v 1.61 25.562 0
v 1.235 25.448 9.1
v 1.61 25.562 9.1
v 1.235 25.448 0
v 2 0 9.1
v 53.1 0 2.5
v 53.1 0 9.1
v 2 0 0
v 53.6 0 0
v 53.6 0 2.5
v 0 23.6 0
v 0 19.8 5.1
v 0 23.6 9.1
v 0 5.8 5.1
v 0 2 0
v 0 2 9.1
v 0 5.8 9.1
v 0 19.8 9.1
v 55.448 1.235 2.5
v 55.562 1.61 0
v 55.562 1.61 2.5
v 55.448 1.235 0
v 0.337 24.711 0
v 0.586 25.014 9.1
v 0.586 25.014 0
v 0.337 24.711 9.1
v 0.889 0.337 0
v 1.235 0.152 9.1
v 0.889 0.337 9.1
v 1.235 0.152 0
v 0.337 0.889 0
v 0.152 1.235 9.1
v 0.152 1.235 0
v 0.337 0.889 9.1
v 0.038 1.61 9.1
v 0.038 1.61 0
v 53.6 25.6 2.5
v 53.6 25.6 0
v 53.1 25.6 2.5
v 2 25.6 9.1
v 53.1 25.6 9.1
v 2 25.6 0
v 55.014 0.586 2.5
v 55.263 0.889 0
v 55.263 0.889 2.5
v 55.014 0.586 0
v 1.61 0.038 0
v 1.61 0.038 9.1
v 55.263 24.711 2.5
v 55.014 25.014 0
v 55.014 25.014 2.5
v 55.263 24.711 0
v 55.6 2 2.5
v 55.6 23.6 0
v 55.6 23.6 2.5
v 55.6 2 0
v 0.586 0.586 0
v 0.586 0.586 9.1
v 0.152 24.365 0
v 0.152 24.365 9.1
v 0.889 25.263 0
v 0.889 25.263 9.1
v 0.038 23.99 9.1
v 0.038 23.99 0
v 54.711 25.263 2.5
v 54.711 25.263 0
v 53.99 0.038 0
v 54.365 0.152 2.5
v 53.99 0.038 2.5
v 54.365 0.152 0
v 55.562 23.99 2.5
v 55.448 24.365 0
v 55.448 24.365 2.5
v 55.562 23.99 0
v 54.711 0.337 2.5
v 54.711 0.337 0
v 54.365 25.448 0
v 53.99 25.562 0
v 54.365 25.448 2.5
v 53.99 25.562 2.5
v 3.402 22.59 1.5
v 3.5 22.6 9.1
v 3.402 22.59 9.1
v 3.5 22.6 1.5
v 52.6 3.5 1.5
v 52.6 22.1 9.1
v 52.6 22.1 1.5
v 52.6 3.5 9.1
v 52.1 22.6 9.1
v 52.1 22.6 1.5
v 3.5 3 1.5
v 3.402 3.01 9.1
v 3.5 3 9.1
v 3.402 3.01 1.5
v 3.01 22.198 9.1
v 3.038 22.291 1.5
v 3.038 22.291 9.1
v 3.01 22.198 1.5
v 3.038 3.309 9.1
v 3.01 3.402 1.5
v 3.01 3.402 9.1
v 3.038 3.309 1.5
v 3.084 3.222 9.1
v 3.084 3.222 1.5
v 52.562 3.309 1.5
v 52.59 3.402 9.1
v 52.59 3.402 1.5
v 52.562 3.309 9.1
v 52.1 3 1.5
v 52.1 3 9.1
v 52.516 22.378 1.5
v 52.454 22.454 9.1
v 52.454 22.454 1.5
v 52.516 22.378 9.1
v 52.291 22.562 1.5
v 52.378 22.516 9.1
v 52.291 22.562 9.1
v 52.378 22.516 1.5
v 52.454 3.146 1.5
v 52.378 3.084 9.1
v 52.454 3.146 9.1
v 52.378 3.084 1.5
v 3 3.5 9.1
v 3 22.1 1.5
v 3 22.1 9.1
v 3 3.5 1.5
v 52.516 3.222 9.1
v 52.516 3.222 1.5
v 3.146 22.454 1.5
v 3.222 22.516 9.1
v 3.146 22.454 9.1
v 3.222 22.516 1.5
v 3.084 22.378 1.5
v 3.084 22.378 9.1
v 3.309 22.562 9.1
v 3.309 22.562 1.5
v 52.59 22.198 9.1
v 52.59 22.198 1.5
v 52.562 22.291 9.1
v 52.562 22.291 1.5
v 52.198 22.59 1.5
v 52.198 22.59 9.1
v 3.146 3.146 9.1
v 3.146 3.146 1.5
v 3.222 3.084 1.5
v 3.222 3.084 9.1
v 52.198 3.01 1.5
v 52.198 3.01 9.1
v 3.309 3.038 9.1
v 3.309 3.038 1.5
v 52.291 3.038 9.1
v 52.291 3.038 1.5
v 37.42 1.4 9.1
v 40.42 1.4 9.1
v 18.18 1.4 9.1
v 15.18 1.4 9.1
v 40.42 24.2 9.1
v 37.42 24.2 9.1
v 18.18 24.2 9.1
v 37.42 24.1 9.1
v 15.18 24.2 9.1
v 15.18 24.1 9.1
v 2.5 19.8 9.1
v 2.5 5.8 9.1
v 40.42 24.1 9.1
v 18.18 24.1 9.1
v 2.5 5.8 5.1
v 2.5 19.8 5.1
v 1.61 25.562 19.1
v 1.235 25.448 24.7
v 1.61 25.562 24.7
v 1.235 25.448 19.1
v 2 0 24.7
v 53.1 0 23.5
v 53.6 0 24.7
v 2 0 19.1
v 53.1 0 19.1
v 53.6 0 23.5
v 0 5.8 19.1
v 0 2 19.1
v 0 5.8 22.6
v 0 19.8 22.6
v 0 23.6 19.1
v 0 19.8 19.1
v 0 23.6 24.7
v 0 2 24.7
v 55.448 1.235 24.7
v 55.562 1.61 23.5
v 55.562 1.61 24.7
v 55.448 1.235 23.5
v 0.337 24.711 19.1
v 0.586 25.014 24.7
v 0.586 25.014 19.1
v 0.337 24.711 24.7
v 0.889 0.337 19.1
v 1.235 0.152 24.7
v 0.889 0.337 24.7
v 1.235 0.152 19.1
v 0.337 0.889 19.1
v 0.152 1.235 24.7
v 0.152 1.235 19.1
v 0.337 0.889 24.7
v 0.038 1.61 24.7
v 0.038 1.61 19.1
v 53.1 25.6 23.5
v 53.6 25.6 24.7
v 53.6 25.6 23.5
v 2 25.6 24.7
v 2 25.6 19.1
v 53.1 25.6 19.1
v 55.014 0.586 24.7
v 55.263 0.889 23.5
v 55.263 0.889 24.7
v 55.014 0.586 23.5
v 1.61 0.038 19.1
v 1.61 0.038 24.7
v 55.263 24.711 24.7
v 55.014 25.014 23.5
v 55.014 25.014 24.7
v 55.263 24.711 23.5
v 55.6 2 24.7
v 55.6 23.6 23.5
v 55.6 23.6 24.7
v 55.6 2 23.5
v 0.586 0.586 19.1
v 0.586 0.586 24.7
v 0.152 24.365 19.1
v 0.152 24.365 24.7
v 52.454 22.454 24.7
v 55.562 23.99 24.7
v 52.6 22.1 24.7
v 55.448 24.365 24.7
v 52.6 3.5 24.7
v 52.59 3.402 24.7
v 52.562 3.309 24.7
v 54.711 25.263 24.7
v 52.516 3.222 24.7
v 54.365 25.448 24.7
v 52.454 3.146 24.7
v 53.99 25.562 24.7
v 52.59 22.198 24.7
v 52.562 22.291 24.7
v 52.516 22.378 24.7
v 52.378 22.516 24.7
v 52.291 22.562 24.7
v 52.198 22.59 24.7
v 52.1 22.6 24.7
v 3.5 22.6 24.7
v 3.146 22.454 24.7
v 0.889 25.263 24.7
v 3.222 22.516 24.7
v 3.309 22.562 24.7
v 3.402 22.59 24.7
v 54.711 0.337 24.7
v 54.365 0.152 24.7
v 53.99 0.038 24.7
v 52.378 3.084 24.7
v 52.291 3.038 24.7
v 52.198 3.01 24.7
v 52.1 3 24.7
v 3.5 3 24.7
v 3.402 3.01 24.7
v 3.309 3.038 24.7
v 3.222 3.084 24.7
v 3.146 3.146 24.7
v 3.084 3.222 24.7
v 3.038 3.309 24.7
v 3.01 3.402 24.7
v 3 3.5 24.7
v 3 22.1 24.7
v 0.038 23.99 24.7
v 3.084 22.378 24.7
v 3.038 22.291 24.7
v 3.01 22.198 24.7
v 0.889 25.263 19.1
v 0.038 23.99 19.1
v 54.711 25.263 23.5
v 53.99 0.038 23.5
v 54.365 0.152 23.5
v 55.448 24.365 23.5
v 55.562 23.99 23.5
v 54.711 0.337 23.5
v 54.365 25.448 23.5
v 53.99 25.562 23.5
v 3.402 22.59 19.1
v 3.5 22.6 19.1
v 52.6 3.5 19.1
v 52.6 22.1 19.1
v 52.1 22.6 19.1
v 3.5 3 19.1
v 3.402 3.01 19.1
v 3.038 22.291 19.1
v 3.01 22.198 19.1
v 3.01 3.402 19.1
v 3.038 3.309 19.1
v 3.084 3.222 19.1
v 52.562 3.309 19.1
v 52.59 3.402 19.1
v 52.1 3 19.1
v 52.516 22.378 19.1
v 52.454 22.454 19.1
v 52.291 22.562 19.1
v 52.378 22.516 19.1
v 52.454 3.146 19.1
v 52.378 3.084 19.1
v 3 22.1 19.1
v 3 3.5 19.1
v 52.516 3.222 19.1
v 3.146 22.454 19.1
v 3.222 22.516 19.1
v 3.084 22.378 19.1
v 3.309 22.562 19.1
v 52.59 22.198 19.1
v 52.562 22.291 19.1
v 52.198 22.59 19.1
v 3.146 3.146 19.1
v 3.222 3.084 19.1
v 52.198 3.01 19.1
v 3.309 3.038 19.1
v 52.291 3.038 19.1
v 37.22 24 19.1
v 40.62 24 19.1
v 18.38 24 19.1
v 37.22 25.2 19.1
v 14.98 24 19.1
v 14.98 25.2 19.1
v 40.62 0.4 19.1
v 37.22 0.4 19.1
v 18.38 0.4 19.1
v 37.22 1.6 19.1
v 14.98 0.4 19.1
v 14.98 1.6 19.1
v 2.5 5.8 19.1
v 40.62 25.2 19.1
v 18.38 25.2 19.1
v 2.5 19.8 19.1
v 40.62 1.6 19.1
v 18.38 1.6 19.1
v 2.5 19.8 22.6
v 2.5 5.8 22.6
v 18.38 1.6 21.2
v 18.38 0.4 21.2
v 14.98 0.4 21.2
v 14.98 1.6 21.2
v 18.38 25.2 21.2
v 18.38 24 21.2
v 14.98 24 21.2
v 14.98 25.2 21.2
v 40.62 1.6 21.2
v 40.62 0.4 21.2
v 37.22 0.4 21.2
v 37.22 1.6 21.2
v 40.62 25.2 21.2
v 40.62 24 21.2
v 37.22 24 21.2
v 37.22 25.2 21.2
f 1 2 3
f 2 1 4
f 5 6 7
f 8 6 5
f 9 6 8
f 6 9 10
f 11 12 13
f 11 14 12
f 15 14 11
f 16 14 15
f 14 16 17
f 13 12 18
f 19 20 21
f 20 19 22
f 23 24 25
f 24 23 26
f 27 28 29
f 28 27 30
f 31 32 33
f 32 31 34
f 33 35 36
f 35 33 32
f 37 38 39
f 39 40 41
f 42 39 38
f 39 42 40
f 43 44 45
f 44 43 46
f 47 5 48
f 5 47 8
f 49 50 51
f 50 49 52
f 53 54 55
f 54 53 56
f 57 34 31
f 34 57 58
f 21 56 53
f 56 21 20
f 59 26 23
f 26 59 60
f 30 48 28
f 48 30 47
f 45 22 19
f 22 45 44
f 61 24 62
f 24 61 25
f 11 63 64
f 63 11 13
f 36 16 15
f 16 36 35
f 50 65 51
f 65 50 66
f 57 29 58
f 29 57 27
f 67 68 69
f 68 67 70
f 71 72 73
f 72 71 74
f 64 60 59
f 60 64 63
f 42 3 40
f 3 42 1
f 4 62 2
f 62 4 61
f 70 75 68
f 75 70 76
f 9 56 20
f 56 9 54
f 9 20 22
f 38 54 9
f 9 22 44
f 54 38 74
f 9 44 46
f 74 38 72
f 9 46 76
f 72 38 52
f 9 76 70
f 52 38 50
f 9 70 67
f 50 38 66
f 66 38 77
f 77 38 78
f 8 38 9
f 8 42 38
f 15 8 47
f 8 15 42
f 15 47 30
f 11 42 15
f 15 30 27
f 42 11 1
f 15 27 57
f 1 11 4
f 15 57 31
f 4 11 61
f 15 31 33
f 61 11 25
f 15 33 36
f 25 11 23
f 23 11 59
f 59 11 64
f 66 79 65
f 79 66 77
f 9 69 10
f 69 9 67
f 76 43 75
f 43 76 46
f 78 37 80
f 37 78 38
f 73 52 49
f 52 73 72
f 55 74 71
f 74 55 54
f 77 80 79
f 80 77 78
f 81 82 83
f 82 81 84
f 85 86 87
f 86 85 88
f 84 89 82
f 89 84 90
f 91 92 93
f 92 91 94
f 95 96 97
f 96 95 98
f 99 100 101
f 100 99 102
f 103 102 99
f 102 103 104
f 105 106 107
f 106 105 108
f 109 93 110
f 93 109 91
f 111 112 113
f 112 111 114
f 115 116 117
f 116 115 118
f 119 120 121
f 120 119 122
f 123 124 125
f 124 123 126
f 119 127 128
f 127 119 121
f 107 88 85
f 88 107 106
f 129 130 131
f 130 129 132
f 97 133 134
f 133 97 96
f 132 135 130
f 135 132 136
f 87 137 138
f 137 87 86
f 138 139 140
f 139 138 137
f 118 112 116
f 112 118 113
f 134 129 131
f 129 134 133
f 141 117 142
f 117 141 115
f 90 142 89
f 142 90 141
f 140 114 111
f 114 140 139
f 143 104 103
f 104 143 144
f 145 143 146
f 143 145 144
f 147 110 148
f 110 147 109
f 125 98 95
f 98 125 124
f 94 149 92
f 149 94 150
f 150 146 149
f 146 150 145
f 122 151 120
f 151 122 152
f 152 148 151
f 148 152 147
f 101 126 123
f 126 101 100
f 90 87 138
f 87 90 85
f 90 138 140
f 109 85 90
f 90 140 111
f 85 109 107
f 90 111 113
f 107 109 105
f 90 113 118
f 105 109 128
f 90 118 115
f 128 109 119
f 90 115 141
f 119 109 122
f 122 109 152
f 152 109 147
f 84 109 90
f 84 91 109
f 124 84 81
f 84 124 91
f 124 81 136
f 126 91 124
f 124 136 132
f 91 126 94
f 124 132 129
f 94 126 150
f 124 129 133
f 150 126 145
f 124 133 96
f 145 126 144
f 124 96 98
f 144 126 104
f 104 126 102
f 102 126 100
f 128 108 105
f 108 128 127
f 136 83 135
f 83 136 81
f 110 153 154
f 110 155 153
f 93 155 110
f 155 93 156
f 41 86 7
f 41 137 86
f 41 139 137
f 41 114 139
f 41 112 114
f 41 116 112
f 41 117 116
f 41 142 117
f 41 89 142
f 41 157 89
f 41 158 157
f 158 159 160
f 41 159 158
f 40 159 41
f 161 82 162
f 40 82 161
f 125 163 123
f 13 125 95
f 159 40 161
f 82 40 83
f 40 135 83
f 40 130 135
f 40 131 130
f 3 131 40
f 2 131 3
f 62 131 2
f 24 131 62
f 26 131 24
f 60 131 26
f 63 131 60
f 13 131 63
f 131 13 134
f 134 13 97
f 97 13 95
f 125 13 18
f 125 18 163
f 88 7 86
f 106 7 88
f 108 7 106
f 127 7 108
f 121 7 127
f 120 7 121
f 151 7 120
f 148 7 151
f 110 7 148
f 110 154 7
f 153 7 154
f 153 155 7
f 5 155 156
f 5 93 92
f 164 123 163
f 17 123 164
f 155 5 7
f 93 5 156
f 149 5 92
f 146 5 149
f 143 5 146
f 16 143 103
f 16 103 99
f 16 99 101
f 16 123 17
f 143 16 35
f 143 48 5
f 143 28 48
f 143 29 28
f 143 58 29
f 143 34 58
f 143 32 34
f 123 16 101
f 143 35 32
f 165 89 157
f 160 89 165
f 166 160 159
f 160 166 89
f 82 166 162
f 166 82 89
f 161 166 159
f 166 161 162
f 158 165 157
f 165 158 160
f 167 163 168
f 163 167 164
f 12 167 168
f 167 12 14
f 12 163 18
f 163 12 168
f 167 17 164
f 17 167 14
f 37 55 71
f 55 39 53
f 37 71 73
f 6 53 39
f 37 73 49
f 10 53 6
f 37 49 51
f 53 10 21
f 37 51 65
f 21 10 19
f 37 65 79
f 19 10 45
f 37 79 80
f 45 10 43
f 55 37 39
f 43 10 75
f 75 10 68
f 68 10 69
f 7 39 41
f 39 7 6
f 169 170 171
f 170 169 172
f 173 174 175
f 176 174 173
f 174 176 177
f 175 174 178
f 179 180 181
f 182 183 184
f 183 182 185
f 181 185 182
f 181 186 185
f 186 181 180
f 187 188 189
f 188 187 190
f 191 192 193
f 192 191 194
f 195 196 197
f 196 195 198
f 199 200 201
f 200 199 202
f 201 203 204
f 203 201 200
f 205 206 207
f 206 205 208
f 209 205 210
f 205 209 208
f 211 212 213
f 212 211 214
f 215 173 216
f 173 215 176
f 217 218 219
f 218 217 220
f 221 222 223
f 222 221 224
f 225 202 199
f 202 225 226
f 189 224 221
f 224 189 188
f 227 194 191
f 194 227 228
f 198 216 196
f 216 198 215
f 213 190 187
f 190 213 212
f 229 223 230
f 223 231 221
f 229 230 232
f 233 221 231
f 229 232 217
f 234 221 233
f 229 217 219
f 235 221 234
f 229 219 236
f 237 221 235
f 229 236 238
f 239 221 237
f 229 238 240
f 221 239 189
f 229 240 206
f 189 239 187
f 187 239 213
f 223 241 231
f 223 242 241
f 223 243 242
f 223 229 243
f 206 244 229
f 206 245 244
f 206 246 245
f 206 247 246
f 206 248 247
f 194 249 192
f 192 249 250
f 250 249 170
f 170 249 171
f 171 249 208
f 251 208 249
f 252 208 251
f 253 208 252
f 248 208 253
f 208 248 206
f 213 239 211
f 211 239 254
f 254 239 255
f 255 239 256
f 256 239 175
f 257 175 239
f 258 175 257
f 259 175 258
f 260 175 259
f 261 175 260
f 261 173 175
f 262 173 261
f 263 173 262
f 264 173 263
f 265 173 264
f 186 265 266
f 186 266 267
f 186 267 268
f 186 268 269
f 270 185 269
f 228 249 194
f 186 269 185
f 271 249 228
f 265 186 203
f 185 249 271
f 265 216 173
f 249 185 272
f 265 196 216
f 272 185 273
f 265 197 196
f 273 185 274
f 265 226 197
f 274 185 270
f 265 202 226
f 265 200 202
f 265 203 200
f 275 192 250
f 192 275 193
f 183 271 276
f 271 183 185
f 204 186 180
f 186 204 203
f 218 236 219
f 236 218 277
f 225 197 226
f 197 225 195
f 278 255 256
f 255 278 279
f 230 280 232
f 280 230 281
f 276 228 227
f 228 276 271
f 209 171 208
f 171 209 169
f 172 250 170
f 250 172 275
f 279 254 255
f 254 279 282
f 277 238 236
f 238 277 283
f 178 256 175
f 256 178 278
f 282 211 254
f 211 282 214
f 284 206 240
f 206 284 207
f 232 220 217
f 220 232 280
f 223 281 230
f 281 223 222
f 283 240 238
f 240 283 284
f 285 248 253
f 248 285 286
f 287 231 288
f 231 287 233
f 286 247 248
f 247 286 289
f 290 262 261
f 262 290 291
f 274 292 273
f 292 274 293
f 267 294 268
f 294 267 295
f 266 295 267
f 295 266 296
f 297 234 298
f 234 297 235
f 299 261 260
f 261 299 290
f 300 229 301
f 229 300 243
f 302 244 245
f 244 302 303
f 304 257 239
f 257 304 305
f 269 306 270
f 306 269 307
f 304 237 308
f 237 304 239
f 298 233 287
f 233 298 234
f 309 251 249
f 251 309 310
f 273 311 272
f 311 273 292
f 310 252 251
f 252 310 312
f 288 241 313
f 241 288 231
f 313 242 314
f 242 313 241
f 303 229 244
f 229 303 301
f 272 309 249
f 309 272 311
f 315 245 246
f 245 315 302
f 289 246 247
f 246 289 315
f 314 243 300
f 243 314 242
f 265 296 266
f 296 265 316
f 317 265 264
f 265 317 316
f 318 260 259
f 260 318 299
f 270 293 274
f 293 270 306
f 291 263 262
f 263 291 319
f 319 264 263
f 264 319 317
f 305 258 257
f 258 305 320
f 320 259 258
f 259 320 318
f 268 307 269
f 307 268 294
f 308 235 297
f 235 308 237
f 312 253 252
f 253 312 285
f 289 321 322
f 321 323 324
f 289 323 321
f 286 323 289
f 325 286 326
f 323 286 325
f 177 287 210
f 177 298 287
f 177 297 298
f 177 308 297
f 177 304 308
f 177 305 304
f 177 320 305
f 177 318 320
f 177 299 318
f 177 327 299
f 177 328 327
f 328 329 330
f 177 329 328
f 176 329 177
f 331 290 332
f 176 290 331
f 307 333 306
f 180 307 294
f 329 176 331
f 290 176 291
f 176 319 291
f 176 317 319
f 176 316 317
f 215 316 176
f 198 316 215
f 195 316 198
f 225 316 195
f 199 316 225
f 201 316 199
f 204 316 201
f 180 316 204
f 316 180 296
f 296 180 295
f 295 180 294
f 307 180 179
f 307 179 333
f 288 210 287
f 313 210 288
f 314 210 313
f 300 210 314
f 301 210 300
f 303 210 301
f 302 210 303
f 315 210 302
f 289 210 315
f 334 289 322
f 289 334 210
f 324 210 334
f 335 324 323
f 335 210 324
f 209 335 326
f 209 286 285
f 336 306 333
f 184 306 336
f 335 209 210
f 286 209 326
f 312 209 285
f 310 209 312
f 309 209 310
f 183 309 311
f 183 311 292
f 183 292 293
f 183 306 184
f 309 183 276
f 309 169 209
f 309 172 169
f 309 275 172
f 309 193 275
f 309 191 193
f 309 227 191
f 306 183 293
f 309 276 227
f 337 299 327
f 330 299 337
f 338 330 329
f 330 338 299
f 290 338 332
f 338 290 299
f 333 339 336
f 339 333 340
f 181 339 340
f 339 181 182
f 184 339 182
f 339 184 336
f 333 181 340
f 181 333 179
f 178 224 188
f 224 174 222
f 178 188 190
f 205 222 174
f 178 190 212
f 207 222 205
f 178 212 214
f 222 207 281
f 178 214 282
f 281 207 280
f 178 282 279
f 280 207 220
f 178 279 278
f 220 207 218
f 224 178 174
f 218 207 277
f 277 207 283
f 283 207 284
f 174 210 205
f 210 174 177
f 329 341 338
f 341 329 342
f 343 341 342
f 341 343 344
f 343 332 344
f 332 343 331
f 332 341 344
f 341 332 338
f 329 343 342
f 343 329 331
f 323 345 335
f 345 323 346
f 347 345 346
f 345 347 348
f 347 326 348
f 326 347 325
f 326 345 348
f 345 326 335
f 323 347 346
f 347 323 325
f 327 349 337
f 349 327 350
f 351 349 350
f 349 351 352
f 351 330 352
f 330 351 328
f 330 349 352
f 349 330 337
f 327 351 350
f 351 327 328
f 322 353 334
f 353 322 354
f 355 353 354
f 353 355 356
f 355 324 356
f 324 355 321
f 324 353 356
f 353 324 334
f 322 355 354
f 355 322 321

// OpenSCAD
/*
 * usb-to-msx-mouse-case.scad — Parametric snap-fit case for USB-to-MSX mouse adapter
 *
 * Two-piece design: bottom (tray) + top (lid) with snap-fit clips.
 * USB-A connector on one short edge, DB-9 on the other.
 *
 * To render:
 *   openscad -o case-bottom.stl -D 'part="bottom"' usb-to-msx-mouse-case.scad
 *   openscad -o case-top.stl -D 'part="top"' usb-to-msx-mouse-case.scad
 *
 * Print settings: PLA, 0.2mm layer height, no supports needed.
 */

/* ── Configuration ────────────────────────────────────────────────── */

// Which part to render: "bottom", "top", or "both" (exploded view)
part = "both";

// PCB dimensions (mm)
pcb_length = 52;      // X axis (USB-A to DB-9)
pcb_width  = 22;      // Y axis
pcb_thick  = 1.6;     // Board thickness

// Case wall parameters
wall = 1.5;           // Wall thickness
gap = 0.3;            // Clearance between PCB and case walls
bottom_thick = 1.5;   // Bottom floor thickness
top_thick = 1.2;      // Top ceiling thickness

// Total interior dimensions
int_length = pcb_length + 2 * gap;
int_width  = pcb_width + 2 * gap;
int_height = 12;      // Interior height (accommodates components + connectors)

// PCB sits on ledges inside the case
pcb_ledge = 0.8;      // Width of support ledge
pcb_z = 3;            // Height of PCB bottom above case floor (clearance for bottom components)

// Connector cutout dimensions
// USB-A female: ~13mm wide x 6mm tall (generous cutout)
usb_width  = 14;
usb_height = 7.5;
usb_z_off  = pcb_z + pcb_thick - 1;  // Bottom of USB cutout

// DB-9 male: ~31mm wide x 12mm tall (includes mounting hardware)
db9_width  = 33;
db9_height = 11;
db9_z_off  = pcb_z - 2;  // DB-9 extends below PCB

// Snap-fit clip dimensions
clip_width = 3;
clip_depth = 0.8;     // How far clip protrudes
clip_height = 2;

// Split height: where bottom ends and top begins
split_z = pcb_z + pcb_thick + 3;  // Just above tallest SMD component

// Outer dimensions (derived)
ext_length = int_length + 2 * wall;
ext_width  = int_width + 2 * wall;
ext_height = int_height + bottom_thick + top_thick;

// Corner rounding
corner_r = 2;

/* ── Modules ──────────────────────────────────────────────────────── */

// Rounded box (hollow)
module rounded_box(l, w, h, r, wall_t) {
    difference() {
        // Outer shell
        hull() {
            for (x = [r, l - r])
                for (y = [r, w - r])
                    translate([x, y, 0])
                        cylinder(h = h, r = r, $fn = 32);
        }
        // Inner cavity
        translate([wall_t, wall_t, wall_t])
            hull() {
                for (x = [r, l - 2 * wall_t - r])
                    for (y = [r, w - 2 * wall_t - r])
                        translate([x, y, 0])
                            cylinder(h = h, r = max(r - wall_t, 0.5), $fn = 32);
            }
    }
}

// PCB support ledges (run along long edges)
module pcb_ledges() {
    // Left ledge
    translate([wall + gap, wall, bottom_thick + pcb_z - pcb_ledge])
        cube([int_length, pcb_ledge, pcb_ledge]);
    // Right ledge
    translate([wall + gap, wall + int_width - pcb_ledge, bottom_thick + pcb_z - pcb_ledge])
        cube([int_length, pcb_ledge, pcb_ledge]);
}

// USB-A cutout (on -X face)
module usb_cutout() {
    translate([-1, (ext_width - usb_width) / 2, bottom_thick + usb_z_off])
        cube([wall + 2, usb_width, usb_height]);
}

// DB-9 cutout (on +X face)
module db9_cutout() {
    translate([ext_length - wall - 1, (ext_width - db9_width) / 2, bottom_thick + db9_z_off])
        cube([wall + 2, db9_width, db9_height]);
}

// Snap-fit clips on bottom half (protrude outward from inner wall)
module snap_clips_bottom() {
    // Two clips per long side
    for (x_pos = [ext_length * 0.3, ext_length * 0.7]) {
        // Left side
        translate([x_pos - clip_width / 2, wall - 0.1, bottom_thick + split_z - clip_height])
            difference() {
                cube([clip_width, clip_depth + 0.1, clip_height]);
                translate([0, clip_depth, clip_height])
                    rotate([0, 90, 0])
                        cylinder(h = clip_width, r = clip_depth, $fn = 16);
            }
        // Right side
        translate([x_pos - clip_width / 2, ext_width - wall - clip_depth, bottom_thick + split_z - clip_height])
            difference() {
                cube([clip_width, clip_depth + 0.1, clip_height]);
                translate([0, 0, clip_height])
                    rotate([0, 90, 0])
                        cylinder(h = clip_width, r = clip_depth, $fn = 16);
            }
    }
}

// Snap-fit slots in top half (recesses to receive clips)
module snap_slots_top() {
    slot_extra = 0.2;  // Extra clearance for snap fit
    for (x_pos = [ext_length * 0.3, ext_length * 0.7]) {
        // Left side
        translate([x_pos - clip_width / 2 - slot_extra, wall - clip_depth - slot_extra - 0.1, -0.1])
            cube([clip_width + 2 * slot_extra, clip_depth + slot_extra + 0.2, clip_height + 0.2]);
        // Right side
        translate([x_pos - clip_width / 2 - slot_extra, ext_width - wall - 0.1, -0.1])
            cube([clip_width + 2 * slot_extra, clip_depth + slot_extra + 0.2, clip_height + 0.2]);
    }
}

// BOOTSEL button access hole (small hole in top, aligned with switch location)
// Switch is approximately at PCB center-left
module bootsel_hole() {
    translate([wall + gap + 12, ext_width / 2, -0.1])
        cylinder(d = 3, h = top_thick + 0.2, $fn = 24);
}

// LED light pipe (small hole in top, aligned with LED)
module led_hole() {
    translate([wall + gap + 24, ext_width / 2 - 3, -0.1])
        cylinder(d = 2, h = top_thick + 0.2, $fn = 24);
}

/* ── Parts ────────────────────────────────────────────────────────── */

module bottom_half() {
    bottom_h = bottom_thick + split_z;

    difference() {
        union() {
            // Main shell (cut at split height)
            intersection() {
                rounded_box(ext_length, ext_width, ext_height, corner_r, wall);
                cube([ext_length + 1, ext_width + 1, bottom_h]);
            }
            // PCB ledges
            pcb_ledges();
            // Snap clips
            snap_clips_bottom();
        }
        // Connector cutouts
        usb_cutout();
        db9_cutout();
    }
}

module top_half() {
    top_h = ext_height - bottom_thick - split_z;

    difference() {
        // Main shell (upper portion)
        translate([0, 0, 0])
            intersection() {
                // Shift the full shell down so we get the top portion
                translate([0, 0, -(bottom_thick + split_z)])
                    rounded_box(ext_length, ext_width, ext_height, corner_r, wall);
                cube([ext_length + 1, ext_width + 1, top_h + top_thick]);
            }
        // Connector cutouts (shifted to match)
        translate([0, 0, -(bottom_thick + split_z)]) {
            usb_cutout();
            db9_cutout();
        }
        // Snap slots
        snap_slots_top();
        // BOOTSEL access hole
        translate([0, 0, top_h + top_thick - top_thick])
            bootsel_hole();
        // LED hole
        translate([0, 0, top_h + top_thick - top_thick])
            led_hole();
    }
}

/* ── Render ───────────────────────────────────────────────────────── */

if (part == "bottom") {
    bottom_half();
} else if (part == "top") {
    // Flip top half upside down for printing
    translate([0, ext_width, ext_height - bottom_thick - split_z])
        rotate([180, 0, 0])
            top_half();
} else if (part == "both") {
    // Exploded view: bottom in place, top offset above
    color("DodgerBlue", 0.8)
        bottom_half();
    color("LightSteelBlue", 0.6)
        translate([0, 0, bottom_thick + split_z + 10])  // 10mm gap for visibility
            top_half();
} else {
    echo("Set part to \"bottom\", \"top\", or \"both\"");
}
